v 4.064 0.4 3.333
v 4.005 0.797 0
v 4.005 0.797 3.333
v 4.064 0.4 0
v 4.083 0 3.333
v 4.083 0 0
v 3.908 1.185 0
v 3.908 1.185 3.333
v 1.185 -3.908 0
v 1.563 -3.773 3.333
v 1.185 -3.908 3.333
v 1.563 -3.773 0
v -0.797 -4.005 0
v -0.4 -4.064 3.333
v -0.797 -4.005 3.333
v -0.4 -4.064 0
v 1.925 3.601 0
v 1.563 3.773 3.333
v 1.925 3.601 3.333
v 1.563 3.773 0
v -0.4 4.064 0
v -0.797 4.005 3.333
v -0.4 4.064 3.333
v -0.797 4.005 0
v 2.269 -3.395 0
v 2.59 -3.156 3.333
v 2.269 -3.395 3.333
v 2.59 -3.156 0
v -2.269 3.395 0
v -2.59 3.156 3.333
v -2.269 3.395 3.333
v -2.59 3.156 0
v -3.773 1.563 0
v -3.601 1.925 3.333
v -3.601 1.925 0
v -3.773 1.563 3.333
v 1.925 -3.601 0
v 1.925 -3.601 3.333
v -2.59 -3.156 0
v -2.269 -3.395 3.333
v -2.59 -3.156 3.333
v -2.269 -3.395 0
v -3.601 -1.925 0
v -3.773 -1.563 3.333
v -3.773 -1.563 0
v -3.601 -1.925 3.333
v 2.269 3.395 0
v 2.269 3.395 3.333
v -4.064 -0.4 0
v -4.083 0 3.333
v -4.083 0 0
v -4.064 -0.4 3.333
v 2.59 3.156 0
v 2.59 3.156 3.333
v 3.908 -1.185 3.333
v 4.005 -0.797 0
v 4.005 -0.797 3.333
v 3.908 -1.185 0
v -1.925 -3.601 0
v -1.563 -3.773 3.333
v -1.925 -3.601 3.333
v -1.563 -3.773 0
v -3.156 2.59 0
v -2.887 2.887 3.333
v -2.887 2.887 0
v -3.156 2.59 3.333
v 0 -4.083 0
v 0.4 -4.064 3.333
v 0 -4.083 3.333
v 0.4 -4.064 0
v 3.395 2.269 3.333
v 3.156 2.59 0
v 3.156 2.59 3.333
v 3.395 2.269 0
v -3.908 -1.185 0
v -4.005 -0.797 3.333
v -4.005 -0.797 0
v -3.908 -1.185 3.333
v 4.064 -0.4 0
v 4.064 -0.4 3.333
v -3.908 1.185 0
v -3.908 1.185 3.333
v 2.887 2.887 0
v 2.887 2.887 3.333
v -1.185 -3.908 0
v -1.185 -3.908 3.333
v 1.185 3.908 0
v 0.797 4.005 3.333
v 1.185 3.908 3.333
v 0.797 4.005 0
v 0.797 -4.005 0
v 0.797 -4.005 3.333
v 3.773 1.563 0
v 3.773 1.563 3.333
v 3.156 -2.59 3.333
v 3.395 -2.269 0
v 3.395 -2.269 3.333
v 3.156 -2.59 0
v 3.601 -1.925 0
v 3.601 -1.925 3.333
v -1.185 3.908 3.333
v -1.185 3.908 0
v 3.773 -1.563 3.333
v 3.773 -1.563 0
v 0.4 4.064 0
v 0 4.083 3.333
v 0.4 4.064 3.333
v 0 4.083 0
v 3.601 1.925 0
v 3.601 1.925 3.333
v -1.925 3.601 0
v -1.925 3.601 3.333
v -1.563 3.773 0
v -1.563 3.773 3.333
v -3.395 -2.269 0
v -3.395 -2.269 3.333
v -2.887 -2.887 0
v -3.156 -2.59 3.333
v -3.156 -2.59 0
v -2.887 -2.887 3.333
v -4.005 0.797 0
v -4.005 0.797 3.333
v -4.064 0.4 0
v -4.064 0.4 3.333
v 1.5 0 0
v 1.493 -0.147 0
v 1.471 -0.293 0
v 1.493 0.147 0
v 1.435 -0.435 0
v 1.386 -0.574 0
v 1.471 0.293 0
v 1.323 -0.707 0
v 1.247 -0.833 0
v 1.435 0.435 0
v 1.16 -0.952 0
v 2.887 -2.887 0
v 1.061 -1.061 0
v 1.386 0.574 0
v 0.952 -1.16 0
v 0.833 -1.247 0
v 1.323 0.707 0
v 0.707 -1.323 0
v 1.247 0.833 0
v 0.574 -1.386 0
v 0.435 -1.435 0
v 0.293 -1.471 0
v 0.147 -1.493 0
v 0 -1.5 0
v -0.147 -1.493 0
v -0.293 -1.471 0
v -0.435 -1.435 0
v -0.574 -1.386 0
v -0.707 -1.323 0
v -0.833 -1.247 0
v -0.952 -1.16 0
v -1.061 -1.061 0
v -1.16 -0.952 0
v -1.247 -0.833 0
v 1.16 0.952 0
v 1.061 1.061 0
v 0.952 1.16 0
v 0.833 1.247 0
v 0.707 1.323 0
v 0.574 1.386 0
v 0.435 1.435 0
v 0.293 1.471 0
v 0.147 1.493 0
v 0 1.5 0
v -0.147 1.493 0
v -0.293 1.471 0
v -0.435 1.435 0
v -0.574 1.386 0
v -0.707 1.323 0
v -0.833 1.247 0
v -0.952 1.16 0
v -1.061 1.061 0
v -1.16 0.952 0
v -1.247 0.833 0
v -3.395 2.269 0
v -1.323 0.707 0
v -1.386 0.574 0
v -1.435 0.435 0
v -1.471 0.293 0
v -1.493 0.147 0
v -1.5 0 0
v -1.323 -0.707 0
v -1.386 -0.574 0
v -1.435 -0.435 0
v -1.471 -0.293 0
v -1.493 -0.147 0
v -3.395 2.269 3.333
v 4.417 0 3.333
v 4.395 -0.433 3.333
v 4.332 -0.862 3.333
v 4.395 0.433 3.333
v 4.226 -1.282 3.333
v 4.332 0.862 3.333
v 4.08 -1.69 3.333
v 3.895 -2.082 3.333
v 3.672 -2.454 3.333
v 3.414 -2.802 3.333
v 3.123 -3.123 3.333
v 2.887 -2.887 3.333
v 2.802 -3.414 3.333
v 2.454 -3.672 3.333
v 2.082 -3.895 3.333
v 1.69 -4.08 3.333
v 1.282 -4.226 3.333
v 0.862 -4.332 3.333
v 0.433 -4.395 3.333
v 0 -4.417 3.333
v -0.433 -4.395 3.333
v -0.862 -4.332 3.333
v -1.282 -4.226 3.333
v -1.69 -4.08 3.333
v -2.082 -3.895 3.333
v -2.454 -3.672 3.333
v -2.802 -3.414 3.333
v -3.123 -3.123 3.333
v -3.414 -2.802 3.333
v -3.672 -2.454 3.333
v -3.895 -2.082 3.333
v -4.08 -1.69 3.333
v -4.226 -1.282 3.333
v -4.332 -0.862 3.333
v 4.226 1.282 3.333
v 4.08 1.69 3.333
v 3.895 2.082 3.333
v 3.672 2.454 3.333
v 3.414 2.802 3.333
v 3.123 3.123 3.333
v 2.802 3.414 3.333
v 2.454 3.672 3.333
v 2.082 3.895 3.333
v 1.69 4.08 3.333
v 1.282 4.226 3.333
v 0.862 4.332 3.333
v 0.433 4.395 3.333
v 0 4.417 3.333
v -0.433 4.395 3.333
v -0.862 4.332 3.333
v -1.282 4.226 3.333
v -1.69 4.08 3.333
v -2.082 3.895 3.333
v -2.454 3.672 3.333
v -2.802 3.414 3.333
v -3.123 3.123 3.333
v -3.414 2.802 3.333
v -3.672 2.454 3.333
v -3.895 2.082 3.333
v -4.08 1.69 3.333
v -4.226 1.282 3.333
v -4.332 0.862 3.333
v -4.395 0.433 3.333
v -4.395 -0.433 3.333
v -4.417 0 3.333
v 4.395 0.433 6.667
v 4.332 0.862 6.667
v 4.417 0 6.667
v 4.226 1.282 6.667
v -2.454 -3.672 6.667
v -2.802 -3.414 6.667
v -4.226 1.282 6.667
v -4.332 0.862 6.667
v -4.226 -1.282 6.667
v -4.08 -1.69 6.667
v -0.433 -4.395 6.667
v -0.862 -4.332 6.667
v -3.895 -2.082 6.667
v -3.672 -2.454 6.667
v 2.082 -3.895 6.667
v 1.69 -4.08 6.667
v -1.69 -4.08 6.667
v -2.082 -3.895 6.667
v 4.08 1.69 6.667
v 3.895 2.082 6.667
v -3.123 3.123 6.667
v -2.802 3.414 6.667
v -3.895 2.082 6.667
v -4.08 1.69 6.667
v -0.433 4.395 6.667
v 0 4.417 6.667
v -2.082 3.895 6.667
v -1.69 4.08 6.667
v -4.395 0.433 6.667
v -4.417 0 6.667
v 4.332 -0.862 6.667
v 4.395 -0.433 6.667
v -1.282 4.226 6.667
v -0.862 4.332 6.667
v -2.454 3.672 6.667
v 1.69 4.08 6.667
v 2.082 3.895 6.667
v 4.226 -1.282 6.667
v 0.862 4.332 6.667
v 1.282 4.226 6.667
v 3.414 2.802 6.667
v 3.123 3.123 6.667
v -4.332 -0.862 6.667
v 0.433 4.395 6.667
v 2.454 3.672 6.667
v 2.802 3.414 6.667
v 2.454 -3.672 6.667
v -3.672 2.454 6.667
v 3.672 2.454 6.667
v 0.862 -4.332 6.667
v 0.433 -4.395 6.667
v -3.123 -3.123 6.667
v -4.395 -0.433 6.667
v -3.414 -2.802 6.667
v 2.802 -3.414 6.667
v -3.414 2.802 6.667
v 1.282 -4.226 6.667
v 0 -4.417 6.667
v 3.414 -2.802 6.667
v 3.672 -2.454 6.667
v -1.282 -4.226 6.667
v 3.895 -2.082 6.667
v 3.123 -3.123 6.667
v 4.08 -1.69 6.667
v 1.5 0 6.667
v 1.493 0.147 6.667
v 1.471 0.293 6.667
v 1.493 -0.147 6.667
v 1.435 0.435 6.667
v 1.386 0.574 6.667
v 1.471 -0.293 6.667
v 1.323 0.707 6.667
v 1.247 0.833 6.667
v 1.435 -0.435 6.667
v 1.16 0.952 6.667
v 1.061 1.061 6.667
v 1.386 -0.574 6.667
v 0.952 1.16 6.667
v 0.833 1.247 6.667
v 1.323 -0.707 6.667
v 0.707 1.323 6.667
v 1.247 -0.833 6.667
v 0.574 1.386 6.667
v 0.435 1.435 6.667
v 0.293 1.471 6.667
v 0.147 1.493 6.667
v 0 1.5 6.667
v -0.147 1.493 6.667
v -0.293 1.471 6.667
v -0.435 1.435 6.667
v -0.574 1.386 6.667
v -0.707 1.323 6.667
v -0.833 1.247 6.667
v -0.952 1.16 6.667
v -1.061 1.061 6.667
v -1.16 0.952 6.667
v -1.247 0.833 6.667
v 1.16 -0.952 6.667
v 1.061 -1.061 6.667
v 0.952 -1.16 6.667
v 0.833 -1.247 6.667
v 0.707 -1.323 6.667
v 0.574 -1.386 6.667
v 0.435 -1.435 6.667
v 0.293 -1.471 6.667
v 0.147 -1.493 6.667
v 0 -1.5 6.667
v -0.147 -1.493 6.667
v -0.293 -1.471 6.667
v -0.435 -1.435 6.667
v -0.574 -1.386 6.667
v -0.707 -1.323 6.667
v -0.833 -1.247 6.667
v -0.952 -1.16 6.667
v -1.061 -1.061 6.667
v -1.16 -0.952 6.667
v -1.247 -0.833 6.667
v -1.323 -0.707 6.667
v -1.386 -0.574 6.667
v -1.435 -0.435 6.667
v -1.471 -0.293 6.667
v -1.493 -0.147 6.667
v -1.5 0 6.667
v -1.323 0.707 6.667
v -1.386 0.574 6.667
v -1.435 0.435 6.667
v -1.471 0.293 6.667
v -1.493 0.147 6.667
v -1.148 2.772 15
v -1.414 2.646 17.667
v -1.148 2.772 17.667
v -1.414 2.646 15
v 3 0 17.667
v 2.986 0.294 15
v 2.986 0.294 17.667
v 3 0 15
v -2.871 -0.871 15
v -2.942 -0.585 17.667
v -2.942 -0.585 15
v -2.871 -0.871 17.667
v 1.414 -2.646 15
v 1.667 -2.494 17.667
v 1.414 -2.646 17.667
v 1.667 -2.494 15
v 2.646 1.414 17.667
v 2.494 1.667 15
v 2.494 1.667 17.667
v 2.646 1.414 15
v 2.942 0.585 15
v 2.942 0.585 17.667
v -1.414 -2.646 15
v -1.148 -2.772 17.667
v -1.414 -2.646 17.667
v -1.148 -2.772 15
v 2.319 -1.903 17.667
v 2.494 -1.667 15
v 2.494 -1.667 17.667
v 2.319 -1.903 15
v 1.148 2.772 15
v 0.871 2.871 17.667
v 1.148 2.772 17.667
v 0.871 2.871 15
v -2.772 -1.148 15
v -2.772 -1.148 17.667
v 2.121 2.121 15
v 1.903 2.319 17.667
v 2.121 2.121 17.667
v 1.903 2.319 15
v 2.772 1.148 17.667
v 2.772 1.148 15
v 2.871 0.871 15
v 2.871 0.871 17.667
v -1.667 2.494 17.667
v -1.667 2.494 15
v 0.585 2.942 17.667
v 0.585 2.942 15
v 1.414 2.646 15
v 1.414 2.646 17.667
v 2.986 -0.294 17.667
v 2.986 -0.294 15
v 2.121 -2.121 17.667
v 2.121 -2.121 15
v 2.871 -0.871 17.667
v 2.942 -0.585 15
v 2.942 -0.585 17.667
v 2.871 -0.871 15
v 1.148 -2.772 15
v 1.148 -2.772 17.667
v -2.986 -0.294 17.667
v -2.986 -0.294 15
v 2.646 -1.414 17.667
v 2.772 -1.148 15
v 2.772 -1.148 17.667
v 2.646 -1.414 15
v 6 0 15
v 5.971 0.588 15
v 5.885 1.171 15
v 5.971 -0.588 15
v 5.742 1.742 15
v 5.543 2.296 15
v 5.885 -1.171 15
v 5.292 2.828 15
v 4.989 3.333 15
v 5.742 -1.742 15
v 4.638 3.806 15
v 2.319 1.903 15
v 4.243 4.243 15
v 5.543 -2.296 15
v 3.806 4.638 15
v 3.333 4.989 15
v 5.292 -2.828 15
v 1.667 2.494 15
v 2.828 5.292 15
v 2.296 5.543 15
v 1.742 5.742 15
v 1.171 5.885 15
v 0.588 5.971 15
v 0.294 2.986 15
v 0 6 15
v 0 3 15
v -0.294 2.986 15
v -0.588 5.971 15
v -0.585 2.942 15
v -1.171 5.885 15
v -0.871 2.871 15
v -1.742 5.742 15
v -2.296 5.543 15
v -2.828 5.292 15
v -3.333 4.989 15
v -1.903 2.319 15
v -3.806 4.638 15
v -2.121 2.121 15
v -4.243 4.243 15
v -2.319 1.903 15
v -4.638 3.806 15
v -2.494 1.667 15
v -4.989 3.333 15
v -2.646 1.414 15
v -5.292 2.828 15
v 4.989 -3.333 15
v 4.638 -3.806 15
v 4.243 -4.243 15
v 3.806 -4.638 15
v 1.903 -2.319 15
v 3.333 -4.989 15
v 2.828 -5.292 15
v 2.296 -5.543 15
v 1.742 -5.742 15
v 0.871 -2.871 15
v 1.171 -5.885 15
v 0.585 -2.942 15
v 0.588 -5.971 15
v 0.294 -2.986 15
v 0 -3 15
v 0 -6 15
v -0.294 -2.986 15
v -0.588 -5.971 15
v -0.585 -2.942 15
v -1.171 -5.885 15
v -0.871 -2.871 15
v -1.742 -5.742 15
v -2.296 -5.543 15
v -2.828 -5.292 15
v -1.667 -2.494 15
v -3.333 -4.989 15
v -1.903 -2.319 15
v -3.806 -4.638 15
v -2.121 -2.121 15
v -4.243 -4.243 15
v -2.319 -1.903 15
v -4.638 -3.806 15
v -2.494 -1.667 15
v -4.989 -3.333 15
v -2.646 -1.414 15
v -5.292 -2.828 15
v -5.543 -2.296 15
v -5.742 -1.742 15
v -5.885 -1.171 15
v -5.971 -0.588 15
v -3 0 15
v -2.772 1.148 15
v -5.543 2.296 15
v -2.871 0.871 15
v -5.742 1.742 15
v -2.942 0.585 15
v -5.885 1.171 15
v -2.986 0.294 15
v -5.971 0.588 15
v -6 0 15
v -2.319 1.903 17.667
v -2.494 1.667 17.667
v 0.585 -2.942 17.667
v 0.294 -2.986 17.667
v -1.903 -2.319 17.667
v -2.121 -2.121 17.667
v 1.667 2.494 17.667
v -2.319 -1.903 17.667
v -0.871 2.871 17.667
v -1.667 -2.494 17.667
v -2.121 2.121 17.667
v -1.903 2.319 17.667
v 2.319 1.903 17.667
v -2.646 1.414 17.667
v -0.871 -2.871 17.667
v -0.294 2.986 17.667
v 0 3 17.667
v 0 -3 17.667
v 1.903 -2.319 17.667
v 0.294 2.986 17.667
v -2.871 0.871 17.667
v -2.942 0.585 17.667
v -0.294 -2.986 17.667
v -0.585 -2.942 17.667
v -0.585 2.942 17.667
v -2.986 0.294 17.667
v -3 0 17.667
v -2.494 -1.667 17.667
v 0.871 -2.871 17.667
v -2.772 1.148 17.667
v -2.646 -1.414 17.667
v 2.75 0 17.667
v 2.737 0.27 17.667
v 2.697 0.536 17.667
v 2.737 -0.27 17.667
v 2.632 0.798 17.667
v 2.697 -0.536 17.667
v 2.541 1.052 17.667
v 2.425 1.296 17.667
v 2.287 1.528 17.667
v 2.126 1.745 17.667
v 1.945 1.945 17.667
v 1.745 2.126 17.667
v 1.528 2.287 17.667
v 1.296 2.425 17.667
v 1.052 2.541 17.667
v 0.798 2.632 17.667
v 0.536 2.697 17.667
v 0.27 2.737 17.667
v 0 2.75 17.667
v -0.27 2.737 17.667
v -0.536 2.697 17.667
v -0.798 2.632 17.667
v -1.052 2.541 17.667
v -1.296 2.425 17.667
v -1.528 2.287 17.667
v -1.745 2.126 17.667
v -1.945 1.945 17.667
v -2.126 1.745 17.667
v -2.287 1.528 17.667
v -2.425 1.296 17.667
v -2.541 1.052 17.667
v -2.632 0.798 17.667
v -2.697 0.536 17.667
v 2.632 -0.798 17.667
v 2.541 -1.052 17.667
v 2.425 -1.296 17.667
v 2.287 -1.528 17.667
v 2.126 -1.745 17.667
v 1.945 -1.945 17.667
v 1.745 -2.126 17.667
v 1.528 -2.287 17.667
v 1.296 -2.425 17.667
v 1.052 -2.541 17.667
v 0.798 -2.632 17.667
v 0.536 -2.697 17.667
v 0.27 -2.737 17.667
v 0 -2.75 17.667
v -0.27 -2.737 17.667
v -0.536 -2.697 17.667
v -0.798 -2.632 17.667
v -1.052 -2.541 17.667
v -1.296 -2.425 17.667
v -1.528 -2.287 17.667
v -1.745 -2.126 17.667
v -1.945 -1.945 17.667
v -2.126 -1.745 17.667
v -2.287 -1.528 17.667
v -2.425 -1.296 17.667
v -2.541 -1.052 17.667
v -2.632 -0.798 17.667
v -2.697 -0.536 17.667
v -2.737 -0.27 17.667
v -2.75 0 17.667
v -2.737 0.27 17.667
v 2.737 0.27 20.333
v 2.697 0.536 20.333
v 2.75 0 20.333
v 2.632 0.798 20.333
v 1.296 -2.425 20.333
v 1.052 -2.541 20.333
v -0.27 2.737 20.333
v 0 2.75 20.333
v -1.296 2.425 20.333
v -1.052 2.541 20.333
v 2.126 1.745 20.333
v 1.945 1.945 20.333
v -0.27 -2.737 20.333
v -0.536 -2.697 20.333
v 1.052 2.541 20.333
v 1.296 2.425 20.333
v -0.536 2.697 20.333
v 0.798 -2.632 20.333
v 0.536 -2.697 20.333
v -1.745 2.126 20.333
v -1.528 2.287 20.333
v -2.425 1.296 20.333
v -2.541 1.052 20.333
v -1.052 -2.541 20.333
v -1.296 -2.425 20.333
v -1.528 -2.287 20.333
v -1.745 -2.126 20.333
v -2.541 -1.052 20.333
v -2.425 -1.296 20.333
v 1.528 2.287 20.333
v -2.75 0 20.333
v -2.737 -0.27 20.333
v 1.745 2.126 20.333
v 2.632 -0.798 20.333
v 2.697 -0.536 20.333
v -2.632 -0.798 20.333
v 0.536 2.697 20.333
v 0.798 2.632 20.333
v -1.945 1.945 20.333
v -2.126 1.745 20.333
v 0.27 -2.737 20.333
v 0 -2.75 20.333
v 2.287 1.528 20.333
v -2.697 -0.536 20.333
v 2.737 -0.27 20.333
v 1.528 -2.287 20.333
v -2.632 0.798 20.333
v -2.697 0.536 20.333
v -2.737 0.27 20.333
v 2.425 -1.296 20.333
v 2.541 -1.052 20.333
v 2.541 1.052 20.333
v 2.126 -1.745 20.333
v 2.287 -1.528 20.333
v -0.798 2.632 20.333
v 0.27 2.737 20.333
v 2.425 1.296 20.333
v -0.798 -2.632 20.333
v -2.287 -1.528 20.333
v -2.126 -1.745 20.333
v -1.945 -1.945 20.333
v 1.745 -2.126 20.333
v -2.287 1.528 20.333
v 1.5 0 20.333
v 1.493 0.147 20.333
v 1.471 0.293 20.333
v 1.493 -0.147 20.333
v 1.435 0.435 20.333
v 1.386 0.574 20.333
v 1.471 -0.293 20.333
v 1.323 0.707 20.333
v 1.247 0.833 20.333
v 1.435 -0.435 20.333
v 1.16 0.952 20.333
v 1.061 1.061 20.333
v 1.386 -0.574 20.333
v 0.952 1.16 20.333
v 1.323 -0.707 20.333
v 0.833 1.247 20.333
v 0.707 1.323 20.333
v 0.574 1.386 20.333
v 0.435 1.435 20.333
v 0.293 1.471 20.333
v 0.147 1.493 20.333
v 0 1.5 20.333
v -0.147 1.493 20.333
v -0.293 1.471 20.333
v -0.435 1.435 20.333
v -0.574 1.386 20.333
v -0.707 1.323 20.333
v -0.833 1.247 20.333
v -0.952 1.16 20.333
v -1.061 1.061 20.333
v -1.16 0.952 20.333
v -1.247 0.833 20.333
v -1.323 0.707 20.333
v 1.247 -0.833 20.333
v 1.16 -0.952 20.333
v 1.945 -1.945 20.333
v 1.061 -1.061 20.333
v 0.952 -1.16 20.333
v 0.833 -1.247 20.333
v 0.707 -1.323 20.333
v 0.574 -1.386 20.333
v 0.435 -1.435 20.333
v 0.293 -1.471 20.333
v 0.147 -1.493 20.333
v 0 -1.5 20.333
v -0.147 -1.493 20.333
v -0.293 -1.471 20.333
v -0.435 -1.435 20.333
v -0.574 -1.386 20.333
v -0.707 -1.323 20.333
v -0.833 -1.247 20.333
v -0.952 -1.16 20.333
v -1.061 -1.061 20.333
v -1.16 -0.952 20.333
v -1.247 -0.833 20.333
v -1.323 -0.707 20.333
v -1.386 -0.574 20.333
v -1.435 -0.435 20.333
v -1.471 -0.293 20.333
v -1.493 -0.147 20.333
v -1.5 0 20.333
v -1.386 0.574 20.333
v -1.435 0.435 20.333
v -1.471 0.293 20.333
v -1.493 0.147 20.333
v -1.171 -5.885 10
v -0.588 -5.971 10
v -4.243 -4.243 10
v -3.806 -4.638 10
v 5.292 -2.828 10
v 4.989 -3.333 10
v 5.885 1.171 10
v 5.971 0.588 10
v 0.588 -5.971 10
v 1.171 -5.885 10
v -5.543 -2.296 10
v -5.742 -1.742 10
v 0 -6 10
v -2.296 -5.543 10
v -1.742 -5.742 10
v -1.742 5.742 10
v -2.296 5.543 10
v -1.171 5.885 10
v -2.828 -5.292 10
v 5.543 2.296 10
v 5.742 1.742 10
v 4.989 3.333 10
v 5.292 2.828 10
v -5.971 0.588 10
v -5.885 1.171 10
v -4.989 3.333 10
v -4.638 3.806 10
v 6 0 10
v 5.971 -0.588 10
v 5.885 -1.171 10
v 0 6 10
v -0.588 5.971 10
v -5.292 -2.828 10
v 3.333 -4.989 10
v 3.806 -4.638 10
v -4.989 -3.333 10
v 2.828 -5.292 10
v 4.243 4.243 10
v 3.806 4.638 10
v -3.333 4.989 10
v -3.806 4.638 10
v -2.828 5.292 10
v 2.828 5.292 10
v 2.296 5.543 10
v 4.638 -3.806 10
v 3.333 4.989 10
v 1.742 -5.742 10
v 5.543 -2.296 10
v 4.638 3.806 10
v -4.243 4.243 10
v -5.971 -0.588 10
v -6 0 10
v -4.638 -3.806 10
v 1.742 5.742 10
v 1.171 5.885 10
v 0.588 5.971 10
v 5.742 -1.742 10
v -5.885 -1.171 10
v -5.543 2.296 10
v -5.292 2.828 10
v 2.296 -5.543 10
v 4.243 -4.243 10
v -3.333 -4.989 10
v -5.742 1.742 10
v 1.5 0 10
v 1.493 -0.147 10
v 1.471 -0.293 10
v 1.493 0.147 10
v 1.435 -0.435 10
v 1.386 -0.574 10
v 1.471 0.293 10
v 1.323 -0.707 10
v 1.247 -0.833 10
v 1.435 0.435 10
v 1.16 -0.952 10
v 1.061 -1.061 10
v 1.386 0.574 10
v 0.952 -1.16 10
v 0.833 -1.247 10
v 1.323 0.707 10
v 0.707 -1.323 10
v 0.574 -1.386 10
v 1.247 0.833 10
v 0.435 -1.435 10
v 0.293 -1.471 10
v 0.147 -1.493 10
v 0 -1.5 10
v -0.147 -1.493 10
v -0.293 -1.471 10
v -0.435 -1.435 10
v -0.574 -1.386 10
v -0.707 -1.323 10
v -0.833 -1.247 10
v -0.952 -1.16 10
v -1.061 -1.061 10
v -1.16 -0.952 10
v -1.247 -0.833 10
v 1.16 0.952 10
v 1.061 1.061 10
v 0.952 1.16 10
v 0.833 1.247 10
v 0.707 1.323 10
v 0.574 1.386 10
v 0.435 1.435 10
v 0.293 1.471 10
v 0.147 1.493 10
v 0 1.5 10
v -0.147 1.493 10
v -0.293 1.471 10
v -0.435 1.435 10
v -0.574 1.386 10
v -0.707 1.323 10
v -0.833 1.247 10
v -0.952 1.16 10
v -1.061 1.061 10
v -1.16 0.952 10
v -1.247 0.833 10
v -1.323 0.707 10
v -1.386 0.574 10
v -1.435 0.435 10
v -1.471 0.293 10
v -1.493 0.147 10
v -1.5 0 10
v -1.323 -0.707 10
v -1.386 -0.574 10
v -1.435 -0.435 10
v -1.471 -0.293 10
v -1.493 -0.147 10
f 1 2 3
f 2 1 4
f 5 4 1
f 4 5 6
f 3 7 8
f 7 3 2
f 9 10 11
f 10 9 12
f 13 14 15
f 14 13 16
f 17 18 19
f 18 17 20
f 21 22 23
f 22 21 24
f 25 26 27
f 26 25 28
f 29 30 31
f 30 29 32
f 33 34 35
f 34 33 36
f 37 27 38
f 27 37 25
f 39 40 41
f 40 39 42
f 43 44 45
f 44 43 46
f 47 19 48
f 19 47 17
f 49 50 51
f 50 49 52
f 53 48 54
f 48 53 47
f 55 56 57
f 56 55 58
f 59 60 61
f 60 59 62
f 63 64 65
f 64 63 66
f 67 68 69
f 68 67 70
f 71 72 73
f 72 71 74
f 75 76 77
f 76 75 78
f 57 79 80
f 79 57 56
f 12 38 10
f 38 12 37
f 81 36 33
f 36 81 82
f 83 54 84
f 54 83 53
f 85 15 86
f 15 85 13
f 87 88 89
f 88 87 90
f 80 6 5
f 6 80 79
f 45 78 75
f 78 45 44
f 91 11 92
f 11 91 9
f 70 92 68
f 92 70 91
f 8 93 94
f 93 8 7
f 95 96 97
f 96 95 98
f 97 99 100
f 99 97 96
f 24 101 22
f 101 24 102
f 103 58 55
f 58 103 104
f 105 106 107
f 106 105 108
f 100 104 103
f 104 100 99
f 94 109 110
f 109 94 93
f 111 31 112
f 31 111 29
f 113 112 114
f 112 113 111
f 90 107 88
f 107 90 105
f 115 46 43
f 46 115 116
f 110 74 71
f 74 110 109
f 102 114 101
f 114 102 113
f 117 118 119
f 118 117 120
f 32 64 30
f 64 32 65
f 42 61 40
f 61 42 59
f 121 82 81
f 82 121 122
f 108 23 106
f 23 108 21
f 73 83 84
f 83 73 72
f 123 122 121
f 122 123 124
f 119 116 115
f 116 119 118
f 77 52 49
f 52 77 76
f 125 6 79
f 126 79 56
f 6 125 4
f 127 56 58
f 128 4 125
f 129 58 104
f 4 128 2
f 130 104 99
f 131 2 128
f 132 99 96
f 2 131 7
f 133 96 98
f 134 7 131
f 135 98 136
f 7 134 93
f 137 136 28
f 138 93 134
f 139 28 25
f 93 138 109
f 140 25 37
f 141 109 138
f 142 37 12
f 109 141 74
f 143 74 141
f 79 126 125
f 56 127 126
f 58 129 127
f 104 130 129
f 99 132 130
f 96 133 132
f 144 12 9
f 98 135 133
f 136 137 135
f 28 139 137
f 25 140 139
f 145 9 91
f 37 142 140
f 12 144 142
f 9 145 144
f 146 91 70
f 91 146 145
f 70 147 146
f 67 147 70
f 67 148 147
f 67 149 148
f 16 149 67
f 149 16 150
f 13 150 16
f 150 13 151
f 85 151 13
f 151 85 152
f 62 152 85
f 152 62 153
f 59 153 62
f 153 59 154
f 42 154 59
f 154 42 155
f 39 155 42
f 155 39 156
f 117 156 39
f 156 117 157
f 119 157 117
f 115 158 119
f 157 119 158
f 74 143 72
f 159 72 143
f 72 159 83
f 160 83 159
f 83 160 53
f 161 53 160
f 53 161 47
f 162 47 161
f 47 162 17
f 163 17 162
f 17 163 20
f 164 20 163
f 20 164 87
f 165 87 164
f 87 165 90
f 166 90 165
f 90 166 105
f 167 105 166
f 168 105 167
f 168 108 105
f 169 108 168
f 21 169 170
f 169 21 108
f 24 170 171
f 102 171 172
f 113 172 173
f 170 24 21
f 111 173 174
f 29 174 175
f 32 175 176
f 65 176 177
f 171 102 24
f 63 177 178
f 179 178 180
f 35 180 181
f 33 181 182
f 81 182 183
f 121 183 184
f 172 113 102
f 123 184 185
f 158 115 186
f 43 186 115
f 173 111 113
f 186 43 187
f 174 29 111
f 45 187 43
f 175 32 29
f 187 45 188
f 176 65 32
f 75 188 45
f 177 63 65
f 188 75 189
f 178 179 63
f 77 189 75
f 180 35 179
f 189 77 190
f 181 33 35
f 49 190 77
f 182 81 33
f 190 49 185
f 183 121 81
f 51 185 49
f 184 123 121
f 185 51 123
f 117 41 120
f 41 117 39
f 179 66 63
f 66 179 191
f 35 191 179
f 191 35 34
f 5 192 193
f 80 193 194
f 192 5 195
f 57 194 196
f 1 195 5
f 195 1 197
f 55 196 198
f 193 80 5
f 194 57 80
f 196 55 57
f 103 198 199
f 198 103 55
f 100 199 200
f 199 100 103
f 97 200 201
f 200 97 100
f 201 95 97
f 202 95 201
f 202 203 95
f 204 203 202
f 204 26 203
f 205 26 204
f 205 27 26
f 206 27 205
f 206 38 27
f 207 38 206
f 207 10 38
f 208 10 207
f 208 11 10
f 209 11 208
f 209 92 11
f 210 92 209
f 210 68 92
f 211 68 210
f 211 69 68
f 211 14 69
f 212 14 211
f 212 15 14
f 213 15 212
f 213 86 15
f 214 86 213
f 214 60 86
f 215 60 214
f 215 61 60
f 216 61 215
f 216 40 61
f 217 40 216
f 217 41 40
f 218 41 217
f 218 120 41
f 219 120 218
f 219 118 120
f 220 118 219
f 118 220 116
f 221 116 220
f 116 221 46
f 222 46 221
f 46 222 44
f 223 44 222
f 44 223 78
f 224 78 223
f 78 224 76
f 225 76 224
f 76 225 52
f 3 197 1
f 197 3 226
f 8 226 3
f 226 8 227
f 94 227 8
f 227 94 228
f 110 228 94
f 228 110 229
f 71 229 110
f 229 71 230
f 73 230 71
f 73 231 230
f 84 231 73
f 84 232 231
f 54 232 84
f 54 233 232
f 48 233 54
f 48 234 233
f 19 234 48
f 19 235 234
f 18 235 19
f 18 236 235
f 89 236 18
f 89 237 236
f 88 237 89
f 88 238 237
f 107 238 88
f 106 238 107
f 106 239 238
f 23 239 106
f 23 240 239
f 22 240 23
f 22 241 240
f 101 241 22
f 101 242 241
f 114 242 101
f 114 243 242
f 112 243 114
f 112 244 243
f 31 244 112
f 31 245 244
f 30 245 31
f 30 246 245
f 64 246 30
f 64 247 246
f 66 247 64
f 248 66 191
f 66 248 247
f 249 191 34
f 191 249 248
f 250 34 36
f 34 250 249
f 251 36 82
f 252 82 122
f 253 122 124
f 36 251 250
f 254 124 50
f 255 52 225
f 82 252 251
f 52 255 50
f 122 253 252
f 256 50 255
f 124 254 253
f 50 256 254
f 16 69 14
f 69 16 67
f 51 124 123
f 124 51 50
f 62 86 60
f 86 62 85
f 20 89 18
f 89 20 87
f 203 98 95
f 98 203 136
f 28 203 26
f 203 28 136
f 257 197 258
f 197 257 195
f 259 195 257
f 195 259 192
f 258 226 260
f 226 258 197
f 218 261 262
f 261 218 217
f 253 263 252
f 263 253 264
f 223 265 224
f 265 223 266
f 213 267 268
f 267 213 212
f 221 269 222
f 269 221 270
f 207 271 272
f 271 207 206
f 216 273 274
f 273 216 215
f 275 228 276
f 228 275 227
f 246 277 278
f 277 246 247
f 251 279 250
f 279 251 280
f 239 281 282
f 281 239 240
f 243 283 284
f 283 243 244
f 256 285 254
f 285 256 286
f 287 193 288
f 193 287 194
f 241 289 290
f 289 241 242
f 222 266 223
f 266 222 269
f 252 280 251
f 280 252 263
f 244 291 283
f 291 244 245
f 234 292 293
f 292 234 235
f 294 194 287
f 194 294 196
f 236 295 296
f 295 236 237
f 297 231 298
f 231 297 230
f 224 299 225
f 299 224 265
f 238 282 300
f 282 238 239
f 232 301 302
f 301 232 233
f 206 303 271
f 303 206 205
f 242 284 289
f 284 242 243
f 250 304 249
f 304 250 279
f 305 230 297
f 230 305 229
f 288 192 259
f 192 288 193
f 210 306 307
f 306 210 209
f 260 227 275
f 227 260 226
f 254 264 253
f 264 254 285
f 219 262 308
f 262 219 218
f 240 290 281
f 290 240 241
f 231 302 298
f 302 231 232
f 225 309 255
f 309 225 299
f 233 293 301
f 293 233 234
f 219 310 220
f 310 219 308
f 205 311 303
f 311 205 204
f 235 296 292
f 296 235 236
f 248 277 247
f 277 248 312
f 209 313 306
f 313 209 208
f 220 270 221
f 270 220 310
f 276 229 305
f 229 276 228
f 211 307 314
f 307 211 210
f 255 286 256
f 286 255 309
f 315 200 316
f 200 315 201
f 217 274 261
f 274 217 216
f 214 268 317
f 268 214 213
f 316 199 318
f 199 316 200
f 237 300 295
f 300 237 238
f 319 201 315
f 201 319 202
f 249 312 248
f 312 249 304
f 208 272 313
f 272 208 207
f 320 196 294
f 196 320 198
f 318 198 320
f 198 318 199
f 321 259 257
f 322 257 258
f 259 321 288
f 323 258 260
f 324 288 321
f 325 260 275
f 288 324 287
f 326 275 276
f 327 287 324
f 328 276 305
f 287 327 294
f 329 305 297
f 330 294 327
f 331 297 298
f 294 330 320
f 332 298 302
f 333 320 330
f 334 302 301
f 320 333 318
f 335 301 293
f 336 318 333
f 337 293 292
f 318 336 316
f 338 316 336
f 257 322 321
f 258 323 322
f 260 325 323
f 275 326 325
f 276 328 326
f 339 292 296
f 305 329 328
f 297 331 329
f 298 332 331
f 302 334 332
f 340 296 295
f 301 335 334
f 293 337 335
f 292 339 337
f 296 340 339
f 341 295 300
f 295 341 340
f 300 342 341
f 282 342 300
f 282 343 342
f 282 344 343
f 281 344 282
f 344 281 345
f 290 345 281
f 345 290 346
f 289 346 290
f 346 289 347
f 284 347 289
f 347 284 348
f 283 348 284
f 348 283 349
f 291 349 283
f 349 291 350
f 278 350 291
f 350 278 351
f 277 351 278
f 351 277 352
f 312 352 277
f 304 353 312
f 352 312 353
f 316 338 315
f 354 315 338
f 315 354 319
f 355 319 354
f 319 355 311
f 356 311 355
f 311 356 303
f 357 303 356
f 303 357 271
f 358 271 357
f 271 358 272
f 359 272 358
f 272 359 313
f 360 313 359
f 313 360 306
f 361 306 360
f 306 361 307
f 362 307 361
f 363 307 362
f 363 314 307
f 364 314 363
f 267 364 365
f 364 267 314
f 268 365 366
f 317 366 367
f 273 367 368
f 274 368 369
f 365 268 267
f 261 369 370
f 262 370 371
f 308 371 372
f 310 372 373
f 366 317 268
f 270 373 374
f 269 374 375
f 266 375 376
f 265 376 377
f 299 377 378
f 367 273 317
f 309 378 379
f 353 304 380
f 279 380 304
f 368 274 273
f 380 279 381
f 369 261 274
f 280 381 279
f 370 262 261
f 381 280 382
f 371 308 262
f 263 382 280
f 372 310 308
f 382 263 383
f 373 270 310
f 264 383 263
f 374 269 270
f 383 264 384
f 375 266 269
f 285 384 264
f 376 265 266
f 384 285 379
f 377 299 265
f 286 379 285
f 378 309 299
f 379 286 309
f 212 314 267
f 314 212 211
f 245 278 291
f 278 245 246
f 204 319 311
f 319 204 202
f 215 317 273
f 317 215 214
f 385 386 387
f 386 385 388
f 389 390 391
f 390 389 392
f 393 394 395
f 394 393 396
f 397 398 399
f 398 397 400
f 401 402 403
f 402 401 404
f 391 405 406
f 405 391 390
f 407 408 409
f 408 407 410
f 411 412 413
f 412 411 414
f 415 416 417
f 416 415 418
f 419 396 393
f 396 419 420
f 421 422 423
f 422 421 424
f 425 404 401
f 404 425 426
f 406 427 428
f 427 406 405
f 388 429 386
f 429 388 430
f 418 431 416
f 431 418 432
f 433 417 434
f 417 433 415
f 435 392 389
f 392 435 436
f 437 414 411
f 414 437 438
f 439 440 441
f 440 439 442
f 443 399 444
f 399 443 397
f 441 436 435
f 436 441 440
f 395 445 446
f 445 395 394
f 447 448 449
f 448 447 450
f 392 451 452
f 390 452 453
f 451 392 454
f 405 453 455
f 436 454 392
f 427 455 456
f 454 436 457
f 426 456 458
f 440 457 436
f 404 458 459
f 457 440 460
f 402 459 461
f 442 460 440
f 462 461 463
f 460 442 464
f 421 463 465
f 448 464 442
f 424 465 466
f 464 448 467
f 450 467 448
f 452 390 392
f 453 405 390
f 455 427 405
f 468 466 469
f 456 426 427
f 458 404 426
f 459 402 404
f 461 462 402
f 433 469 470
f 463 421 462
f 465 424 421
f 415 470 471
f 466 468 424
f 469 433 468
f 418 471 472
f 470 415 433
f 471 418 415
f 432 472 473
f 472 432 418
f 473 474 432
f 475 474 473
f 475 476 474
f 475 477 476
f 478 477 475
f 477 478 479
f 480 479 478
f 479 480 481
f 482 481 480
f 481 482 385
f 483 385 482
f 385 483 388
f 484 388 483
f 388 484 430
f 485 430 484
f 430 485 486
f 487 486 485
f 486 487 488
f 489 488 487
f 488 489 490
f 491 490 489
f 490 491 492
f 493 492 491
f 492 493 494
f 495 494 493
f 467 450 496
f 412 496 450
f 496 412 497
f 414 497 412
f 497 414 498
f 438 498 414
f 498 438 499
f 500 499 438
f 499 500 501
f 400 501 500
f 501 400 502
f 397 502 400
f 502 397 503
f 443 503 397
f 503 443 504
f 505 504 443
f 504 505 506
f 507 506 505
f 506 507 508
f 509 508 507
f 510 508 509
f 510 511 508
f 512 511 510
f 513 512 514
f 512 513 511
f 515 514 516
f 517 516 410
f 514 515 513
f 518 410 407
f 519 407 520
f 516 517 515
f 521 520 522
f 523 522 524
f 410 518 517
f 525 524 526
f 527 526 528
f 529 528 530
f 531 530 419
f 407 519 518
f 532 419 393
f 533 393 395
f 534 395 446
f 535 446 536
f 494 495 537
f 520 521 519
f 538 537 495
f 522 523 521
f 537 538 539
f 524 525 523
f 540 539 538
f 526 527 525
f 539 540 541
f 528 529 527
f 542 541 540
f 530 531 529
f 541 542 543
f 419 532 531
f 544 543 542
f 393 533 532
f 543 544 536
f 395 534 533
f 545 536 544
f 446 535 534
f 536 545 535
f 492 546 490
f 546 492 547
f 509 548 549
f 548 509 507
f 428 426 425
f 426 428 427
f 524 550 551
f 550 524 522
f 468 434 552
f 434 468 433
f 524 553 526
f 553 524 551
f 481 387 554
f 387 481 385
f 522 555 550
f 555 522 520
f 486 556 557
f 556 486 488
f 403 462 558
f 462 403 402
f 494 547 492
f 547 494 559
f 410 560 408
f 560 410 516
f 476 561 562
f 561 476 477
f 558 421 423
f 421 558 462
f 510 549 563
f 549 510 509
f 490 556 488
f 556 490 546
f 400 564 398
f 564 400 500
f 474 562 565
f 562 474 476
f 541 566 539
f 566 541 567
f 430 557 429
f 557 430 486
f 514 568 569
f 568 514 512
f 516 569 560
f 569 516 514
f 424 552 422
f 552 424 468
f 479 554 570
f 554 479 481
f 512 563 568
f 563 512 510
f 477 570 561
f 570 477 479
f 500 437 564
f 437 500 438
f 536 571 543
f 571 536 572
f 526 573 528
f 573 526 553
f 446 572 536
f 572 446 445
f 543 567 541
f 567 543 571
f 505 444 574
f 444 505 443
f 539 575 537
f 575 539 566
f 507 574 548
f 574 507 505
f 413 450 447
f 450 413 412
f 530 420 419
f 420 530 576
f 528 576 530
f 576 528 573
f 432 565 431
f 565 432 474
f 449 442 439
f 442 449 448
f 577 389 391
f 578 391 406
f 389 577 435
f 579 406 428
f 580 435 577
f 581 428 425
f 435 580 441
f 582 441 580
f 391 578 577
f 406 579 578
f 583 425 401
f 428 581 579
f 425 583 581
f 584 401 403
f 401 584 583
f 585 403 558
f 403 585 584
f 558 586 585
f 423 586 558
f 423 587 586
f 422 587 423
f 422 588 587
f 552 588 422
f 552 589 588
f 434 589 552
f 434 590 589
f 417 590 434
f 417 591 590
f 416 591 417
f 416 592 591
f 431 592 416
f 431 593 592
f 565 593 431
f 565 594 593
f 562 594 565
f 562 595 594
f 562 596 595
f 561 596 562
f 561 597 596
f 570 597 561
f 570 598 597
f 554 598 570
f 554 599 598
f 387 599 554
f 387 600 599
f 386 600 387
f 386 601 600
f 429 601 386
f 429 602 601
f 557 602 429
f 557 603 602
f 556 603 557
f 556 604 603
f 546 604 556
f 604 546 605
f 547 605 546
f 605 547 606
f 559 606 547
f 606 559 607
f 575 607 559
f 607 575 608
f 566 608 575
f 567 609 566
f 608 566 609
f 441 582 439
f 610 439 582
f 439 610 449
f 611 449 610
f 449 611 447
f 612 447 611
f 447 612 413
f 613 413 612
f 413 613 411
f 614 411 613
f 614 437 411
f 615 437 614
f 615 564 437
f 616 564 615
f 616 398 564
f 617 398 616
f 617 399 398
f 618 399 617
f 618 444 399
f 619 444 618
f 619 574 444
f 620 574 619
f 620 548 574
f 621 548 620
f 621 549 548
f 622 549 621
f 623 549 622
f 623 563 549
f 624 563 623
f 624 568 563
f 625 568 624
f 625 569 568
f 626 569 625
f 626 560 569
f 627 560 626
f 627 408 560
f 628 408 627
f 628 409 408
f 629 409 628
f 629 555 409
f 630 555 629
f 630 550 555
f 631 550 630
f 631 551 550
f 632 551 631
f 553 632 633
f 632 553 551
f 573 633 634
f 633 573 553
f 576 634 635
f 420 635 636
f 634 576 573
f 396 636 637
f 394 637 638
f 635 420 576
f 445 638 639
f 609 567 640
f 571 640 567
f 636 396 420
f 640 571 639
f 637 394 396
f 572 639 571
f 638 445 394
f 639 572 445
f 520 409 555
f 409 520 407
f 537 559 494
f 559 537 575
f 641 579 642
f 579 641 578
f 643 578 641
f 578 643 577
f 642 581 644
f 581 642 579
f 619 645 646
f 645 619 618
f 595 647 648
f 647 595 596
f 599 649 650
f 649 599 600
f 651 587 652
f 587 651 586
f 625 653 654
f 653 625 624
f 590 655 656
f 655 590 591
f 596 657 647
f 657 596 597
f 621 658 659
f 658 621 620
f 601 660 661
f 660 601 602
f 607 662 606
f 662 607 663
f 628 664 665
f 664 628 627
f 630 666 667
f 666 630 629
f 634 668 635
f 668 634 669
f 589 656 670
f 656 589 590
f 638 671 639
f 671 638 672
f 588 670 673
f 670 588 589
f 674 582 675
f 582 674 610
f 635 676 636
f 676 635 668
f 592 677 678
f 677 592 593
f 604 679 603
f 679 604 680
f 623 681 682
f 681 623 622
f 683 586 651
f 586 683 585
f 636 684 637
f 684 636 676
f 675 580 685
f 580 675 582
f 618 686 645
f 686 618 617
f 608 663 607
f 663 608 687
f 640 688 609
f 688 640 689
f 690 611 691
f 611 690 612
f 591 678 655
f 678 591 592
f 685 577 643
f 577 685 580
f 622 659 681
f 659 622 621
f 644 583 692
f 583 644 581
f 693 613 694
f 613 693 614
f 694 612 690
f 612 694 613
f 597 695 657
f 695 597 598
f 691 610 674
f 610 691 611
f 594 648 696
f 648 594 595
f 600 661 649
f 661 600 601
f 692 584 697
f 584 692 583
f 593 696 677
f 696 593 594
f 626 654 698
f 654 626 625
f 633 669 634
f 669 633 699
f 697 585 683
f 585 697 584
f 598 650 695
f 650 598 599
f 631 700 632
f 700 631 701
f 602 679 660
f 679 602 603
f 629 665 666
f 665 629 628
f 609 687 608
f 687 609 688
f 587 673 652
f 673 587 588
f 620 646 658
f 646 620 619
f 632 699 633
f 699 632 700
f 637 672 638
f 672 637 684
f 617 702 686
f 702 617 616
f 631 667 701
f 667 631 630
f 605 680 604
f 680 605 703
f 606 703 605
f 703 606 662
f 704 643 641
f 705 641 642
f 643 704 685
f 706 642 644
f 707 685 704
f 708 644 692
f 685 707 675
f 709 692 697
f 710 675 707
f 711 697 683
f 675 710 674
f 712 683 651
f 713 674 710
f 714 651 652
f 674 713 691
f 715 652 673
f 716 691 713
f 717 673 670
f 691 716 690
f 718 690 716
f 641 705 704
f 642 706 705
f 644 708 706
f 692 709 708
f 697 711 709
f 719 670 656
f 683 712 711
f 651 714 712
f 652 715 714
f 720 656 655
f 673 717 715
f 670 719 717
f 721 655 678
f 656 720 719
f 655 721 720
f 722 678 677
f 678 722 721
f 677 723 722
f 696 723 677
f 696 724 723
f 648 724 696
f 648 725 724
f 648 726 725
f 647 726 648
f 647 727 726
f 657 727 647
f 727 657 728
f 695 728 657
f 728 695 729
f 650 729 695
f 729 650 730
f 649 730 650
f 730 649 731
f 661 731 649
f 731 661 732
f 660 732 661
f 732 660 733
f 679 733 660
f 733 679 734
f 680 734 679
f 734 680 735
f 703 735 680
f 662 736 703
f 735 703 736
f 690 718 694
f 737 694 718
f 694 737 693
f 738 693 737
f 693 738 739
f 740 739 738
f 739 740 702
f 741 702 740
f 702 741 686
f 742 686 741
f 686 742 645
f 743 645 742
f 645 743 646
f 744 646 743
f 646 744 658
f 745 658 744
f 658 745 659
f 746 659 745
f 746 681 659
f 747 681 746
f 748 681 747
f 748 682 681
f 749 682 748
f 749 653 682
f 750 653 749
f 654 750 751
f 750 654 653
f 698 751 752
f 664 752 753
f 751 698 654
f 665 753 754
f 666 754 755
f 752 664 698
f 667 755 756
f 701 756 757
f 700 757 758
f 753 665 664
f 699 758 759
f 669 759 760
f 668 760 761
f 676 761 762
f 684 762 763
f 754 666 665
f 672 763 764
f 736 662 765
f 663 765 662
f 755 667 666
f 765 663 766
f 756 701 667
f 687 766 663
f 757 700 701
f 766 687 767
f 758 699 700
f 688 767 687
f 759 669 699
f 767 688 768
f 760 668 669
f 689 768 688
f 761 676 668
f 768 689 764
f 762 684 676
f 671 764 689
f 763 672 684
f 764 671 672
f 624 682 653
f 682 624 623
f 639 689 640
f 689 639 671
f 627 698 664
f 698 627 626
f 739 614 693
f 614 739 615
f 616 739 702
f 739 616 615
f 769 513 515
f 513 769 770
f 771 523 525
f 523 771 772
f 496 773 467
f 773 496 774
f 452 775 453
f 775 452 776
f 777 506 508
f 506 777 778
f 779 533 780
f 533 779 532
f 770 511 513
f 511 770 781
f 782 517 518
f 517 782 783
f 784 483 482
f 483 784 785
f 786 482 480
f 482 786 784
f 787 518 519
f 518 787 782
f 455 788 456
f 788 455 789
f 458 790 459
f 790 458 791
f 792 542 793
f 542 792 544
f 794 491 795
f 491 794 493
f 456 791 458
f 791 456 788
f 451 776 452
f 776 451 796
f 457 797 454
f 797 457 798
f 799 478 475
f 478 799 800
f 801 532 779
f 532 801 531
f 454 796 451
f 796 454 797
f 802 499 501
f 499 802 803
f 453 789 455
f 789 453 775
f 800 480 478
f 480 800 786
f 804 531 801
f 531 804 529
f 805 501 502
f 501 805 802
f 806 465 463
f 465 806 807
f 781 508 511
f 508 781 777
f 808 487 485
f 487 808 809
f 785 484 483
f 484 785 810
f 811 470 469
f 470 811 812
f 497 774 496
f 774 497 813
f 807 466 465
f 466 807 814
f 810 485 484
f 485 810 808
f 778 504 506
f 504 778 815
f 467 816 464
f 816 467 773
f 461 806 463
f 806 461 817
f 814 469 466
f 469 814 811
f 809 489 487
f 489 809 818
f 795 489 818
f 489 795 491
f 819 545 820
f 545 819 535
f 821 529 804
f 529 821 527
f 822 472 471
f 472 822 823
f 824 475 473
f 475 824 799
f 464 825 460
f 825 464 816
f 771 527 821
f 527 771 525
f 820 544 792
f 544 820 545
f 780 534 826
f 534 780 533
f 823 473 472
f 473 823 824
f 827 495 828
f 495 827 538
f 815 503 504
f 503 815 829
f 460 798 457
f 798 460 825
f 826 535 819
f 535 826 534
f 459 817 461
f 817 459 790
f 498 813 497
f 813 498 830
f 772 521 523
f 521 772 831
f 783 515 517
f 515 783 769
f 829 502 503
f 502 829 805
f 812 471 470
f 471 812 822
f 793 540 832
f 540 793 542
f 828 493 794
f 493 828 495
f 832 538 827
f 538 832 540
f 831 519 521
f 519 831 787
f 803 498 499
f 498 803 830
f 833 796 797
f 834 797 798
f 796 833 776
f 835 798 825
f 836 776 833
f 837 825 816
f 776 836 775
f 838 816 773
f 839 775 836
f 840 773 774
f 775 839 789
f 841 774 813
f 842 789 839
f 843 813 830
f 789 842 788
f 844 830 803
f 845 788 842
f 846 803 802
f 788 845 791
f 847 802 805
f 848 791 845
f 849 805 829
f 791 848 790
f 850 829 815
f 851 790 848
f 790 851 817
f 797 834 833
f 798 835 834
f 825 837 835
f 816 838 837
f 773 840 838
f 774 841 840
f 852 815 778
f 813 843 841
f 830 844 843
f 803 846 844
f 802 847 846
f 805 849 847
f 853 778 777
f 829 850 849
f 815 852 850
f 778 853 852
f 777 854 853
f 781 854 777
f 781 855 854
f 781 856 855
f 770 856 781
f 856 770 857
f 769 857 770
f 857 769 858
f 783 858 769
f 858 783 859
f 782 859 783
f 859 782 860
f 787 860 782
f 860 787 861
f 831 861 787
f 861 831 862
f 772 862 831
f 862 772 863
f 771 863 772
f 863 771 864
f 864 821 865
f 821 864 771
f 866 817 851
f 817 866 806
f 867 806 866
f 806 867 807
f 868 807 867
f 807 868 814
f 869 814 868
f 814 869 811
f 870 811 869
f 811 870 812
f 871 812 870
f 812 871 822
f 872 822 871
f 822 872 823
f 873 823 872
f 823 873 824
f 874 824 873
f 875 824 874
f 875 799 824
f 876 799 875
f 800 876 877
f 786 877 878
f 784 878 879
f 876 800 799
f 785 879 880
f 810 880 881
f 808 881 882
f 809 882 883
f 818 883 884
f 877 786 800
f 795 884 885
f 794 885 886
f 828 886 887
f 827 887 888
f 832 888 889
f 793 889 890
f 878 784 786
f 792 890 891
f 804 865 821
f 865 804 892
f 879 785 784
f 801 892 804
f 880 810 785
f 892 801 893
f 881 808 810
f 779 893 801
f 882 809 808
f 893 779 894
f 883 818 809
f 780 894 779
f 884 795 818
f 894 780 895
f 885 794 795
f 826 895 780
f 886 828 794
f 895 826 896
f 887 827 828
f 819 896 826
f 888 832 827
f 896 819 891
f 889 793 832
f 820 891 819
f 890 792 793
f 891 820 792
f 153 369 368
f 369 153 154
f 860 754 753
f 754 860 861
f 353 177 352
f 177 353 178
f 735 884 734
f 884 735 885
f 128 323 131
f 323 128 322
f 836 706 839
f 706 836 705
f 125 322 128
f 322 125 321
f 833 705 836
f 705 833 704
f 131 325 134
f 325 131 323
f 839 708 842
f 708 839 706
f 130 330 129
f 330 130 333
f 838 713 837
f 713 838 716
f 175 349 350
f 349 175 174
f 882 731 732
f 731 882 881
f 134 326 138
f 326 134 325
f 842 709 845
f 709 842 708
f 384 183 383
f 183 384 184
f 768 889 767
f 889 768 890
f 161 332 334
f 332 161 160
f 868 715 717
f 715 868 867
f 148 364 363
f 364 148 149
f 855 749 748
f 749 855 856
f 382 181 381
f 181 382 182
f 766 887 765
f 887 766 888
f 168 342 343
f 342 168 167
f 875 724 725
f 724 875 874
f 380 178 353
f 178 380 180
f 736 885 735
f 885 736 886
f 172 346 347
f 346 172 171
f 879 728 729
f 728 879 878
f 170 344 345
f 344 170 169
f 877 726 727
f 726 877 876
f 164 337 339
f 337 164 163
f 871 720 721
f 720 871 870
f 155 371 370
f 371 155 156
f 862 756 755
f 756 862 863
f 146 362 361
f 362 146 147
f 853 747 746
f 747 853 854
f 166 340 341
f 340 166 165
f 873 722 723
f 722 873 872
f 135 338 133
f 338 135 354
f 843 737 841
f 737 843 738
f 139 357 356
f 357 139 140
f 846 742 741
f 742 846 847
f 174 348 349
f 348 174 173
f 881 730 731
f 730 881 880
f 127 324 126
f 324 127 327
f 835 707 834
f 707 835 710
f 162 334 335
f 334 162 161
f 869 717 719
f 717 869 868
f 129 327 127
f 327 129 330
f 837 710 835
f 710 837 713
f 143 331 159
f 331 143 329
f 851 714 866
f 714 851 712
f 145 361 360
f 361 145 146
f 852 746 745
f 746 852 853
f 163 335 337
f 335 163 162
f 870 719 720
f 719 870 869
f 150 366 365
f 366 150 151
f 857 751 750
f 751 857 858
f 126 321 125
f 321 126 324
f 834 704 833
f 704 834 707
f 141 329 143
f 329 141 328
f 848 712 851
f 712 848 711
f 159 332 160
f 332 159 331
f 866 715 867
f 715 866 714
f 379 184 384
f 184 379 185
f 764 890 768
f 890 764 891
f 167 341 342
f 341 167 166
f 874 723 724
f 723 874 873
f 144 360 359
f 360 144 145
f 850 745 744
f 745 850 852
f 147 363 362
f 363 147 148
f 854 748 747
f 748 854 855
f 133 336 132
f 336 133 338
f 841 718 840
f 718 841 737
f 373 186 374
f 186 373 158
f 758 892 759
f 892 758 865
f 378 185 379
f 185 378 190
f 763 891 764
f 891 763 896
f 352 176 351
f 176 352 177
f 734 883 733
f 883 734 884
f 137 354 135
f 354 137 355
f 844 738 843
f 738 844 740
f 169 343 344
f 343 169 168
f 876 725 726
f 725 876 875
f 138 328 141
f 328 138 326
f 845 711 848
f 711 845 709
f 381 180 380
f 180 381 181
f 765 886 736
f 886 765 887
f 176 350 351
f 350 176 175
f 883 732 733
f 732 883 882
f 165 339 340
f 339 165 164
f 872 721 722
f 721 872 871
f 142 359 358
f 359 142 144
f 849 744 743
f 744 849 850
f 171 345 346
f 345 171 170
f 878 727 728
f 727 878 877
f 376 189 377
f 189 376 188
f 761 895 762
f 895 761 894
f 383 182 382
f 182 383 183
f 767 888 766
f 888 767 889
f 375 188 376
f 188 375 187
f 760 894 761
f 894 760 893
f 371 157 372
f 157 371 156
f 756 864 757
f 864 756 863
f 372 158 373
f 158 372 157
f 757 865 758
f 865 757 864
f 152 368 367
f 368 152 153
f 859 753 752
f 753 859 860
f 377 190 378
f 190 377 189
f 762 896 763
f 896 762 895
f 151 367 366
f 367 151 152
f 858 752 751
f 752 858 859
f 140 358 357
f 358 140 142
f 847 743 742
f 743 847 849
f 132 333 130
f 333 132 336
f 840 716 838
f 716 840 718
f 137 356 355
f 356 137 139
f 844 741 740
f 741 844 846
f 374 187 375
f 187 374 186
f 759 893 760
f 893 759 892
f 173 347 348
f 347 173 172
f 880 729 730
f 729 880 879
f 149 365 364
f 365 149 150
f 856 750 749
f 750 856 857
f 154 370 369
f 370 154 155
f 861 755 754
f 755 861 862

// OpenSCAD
// Hose-barb reducer: 8 mm tubing (barbs) -> 5 mm tubing (barbs)
// Print orientation: standing upright along Z

$fn = 64;

// ---- 8 mm tubing barbs ----
barb8_bottom_d = 7.5;    // outer diameter at bottom of barbs
barb8_top_d    = 9.5;    // outer diameter at top of barbs
barb8_count    = 2;      // number of barbs (stacked)
barb8_height   = 10;     // barb height (z = 0 to 20, two barbs)

// ---- Collar ----
collar_d       = 12;     // collar diameter
collar_h       = 5;      // collar height (z = 20 to 25)

// ---- 5 mm tubing barbs ----
barb5_bottom_d = 6.5;    // outer diameter at bottom of barbs
barb5_top_d    = 5.0;    // outer diameter at top of barbs
barb5_count    = 2;      // number of barbs (stacked)
barb5_height   = 8;      // barb height (z = 25 to 41)

// ---- Through bore ----
bore_d         = 3;      // full-length bore diameter

// ---- Derived ----
z0             = 0;      // start of barbs
z8             = barb8_height;  // end of 8 mm barbs
zcollar        = z8 + collar_h;     // end of collar
z5             = zcollar + barb5_height; // end of 5 mm barbs
eps            = 0.5;    // cutter overshoot

difference() {
    union() {
        // 8 mm barbs: sawtooth profile, stacked
        for (i = [0 : barb8_count - 1]) {
            translate([0, 0, z0 + i * barb8_height / (barb8_count + 1)])
                cylinder(h = barb8_height / (barb8_count + 1),
                         d = barb8_bottom_d + (i + 1) * (barb8_top_d - barb8_bottom_d) / (barb8_count + 1));
        }

        // Collar
        translate([0, 0, z8])
            cylinder(h = collar_h, d = collar_d);

        // 5 mm barbs: tapered profile, stacked
        for (i = [0 : barb5_count - 1]) {
            translate([0, 0, zcollar + i * barb5_height / (barb5_count + 1)])
                cylinder(h = barb5_height / (barb5_count + 1),
                         d = barb5_bottom_d + (i + 1) * (barb5_top_d - barb5_bottom_d) / (barb5_count + 1));
        }
    }

    // Full-length bore
    translate([0, 0, -eps])
        cylinder(h = z5 + 2 * eps, d = bore_d);
}
